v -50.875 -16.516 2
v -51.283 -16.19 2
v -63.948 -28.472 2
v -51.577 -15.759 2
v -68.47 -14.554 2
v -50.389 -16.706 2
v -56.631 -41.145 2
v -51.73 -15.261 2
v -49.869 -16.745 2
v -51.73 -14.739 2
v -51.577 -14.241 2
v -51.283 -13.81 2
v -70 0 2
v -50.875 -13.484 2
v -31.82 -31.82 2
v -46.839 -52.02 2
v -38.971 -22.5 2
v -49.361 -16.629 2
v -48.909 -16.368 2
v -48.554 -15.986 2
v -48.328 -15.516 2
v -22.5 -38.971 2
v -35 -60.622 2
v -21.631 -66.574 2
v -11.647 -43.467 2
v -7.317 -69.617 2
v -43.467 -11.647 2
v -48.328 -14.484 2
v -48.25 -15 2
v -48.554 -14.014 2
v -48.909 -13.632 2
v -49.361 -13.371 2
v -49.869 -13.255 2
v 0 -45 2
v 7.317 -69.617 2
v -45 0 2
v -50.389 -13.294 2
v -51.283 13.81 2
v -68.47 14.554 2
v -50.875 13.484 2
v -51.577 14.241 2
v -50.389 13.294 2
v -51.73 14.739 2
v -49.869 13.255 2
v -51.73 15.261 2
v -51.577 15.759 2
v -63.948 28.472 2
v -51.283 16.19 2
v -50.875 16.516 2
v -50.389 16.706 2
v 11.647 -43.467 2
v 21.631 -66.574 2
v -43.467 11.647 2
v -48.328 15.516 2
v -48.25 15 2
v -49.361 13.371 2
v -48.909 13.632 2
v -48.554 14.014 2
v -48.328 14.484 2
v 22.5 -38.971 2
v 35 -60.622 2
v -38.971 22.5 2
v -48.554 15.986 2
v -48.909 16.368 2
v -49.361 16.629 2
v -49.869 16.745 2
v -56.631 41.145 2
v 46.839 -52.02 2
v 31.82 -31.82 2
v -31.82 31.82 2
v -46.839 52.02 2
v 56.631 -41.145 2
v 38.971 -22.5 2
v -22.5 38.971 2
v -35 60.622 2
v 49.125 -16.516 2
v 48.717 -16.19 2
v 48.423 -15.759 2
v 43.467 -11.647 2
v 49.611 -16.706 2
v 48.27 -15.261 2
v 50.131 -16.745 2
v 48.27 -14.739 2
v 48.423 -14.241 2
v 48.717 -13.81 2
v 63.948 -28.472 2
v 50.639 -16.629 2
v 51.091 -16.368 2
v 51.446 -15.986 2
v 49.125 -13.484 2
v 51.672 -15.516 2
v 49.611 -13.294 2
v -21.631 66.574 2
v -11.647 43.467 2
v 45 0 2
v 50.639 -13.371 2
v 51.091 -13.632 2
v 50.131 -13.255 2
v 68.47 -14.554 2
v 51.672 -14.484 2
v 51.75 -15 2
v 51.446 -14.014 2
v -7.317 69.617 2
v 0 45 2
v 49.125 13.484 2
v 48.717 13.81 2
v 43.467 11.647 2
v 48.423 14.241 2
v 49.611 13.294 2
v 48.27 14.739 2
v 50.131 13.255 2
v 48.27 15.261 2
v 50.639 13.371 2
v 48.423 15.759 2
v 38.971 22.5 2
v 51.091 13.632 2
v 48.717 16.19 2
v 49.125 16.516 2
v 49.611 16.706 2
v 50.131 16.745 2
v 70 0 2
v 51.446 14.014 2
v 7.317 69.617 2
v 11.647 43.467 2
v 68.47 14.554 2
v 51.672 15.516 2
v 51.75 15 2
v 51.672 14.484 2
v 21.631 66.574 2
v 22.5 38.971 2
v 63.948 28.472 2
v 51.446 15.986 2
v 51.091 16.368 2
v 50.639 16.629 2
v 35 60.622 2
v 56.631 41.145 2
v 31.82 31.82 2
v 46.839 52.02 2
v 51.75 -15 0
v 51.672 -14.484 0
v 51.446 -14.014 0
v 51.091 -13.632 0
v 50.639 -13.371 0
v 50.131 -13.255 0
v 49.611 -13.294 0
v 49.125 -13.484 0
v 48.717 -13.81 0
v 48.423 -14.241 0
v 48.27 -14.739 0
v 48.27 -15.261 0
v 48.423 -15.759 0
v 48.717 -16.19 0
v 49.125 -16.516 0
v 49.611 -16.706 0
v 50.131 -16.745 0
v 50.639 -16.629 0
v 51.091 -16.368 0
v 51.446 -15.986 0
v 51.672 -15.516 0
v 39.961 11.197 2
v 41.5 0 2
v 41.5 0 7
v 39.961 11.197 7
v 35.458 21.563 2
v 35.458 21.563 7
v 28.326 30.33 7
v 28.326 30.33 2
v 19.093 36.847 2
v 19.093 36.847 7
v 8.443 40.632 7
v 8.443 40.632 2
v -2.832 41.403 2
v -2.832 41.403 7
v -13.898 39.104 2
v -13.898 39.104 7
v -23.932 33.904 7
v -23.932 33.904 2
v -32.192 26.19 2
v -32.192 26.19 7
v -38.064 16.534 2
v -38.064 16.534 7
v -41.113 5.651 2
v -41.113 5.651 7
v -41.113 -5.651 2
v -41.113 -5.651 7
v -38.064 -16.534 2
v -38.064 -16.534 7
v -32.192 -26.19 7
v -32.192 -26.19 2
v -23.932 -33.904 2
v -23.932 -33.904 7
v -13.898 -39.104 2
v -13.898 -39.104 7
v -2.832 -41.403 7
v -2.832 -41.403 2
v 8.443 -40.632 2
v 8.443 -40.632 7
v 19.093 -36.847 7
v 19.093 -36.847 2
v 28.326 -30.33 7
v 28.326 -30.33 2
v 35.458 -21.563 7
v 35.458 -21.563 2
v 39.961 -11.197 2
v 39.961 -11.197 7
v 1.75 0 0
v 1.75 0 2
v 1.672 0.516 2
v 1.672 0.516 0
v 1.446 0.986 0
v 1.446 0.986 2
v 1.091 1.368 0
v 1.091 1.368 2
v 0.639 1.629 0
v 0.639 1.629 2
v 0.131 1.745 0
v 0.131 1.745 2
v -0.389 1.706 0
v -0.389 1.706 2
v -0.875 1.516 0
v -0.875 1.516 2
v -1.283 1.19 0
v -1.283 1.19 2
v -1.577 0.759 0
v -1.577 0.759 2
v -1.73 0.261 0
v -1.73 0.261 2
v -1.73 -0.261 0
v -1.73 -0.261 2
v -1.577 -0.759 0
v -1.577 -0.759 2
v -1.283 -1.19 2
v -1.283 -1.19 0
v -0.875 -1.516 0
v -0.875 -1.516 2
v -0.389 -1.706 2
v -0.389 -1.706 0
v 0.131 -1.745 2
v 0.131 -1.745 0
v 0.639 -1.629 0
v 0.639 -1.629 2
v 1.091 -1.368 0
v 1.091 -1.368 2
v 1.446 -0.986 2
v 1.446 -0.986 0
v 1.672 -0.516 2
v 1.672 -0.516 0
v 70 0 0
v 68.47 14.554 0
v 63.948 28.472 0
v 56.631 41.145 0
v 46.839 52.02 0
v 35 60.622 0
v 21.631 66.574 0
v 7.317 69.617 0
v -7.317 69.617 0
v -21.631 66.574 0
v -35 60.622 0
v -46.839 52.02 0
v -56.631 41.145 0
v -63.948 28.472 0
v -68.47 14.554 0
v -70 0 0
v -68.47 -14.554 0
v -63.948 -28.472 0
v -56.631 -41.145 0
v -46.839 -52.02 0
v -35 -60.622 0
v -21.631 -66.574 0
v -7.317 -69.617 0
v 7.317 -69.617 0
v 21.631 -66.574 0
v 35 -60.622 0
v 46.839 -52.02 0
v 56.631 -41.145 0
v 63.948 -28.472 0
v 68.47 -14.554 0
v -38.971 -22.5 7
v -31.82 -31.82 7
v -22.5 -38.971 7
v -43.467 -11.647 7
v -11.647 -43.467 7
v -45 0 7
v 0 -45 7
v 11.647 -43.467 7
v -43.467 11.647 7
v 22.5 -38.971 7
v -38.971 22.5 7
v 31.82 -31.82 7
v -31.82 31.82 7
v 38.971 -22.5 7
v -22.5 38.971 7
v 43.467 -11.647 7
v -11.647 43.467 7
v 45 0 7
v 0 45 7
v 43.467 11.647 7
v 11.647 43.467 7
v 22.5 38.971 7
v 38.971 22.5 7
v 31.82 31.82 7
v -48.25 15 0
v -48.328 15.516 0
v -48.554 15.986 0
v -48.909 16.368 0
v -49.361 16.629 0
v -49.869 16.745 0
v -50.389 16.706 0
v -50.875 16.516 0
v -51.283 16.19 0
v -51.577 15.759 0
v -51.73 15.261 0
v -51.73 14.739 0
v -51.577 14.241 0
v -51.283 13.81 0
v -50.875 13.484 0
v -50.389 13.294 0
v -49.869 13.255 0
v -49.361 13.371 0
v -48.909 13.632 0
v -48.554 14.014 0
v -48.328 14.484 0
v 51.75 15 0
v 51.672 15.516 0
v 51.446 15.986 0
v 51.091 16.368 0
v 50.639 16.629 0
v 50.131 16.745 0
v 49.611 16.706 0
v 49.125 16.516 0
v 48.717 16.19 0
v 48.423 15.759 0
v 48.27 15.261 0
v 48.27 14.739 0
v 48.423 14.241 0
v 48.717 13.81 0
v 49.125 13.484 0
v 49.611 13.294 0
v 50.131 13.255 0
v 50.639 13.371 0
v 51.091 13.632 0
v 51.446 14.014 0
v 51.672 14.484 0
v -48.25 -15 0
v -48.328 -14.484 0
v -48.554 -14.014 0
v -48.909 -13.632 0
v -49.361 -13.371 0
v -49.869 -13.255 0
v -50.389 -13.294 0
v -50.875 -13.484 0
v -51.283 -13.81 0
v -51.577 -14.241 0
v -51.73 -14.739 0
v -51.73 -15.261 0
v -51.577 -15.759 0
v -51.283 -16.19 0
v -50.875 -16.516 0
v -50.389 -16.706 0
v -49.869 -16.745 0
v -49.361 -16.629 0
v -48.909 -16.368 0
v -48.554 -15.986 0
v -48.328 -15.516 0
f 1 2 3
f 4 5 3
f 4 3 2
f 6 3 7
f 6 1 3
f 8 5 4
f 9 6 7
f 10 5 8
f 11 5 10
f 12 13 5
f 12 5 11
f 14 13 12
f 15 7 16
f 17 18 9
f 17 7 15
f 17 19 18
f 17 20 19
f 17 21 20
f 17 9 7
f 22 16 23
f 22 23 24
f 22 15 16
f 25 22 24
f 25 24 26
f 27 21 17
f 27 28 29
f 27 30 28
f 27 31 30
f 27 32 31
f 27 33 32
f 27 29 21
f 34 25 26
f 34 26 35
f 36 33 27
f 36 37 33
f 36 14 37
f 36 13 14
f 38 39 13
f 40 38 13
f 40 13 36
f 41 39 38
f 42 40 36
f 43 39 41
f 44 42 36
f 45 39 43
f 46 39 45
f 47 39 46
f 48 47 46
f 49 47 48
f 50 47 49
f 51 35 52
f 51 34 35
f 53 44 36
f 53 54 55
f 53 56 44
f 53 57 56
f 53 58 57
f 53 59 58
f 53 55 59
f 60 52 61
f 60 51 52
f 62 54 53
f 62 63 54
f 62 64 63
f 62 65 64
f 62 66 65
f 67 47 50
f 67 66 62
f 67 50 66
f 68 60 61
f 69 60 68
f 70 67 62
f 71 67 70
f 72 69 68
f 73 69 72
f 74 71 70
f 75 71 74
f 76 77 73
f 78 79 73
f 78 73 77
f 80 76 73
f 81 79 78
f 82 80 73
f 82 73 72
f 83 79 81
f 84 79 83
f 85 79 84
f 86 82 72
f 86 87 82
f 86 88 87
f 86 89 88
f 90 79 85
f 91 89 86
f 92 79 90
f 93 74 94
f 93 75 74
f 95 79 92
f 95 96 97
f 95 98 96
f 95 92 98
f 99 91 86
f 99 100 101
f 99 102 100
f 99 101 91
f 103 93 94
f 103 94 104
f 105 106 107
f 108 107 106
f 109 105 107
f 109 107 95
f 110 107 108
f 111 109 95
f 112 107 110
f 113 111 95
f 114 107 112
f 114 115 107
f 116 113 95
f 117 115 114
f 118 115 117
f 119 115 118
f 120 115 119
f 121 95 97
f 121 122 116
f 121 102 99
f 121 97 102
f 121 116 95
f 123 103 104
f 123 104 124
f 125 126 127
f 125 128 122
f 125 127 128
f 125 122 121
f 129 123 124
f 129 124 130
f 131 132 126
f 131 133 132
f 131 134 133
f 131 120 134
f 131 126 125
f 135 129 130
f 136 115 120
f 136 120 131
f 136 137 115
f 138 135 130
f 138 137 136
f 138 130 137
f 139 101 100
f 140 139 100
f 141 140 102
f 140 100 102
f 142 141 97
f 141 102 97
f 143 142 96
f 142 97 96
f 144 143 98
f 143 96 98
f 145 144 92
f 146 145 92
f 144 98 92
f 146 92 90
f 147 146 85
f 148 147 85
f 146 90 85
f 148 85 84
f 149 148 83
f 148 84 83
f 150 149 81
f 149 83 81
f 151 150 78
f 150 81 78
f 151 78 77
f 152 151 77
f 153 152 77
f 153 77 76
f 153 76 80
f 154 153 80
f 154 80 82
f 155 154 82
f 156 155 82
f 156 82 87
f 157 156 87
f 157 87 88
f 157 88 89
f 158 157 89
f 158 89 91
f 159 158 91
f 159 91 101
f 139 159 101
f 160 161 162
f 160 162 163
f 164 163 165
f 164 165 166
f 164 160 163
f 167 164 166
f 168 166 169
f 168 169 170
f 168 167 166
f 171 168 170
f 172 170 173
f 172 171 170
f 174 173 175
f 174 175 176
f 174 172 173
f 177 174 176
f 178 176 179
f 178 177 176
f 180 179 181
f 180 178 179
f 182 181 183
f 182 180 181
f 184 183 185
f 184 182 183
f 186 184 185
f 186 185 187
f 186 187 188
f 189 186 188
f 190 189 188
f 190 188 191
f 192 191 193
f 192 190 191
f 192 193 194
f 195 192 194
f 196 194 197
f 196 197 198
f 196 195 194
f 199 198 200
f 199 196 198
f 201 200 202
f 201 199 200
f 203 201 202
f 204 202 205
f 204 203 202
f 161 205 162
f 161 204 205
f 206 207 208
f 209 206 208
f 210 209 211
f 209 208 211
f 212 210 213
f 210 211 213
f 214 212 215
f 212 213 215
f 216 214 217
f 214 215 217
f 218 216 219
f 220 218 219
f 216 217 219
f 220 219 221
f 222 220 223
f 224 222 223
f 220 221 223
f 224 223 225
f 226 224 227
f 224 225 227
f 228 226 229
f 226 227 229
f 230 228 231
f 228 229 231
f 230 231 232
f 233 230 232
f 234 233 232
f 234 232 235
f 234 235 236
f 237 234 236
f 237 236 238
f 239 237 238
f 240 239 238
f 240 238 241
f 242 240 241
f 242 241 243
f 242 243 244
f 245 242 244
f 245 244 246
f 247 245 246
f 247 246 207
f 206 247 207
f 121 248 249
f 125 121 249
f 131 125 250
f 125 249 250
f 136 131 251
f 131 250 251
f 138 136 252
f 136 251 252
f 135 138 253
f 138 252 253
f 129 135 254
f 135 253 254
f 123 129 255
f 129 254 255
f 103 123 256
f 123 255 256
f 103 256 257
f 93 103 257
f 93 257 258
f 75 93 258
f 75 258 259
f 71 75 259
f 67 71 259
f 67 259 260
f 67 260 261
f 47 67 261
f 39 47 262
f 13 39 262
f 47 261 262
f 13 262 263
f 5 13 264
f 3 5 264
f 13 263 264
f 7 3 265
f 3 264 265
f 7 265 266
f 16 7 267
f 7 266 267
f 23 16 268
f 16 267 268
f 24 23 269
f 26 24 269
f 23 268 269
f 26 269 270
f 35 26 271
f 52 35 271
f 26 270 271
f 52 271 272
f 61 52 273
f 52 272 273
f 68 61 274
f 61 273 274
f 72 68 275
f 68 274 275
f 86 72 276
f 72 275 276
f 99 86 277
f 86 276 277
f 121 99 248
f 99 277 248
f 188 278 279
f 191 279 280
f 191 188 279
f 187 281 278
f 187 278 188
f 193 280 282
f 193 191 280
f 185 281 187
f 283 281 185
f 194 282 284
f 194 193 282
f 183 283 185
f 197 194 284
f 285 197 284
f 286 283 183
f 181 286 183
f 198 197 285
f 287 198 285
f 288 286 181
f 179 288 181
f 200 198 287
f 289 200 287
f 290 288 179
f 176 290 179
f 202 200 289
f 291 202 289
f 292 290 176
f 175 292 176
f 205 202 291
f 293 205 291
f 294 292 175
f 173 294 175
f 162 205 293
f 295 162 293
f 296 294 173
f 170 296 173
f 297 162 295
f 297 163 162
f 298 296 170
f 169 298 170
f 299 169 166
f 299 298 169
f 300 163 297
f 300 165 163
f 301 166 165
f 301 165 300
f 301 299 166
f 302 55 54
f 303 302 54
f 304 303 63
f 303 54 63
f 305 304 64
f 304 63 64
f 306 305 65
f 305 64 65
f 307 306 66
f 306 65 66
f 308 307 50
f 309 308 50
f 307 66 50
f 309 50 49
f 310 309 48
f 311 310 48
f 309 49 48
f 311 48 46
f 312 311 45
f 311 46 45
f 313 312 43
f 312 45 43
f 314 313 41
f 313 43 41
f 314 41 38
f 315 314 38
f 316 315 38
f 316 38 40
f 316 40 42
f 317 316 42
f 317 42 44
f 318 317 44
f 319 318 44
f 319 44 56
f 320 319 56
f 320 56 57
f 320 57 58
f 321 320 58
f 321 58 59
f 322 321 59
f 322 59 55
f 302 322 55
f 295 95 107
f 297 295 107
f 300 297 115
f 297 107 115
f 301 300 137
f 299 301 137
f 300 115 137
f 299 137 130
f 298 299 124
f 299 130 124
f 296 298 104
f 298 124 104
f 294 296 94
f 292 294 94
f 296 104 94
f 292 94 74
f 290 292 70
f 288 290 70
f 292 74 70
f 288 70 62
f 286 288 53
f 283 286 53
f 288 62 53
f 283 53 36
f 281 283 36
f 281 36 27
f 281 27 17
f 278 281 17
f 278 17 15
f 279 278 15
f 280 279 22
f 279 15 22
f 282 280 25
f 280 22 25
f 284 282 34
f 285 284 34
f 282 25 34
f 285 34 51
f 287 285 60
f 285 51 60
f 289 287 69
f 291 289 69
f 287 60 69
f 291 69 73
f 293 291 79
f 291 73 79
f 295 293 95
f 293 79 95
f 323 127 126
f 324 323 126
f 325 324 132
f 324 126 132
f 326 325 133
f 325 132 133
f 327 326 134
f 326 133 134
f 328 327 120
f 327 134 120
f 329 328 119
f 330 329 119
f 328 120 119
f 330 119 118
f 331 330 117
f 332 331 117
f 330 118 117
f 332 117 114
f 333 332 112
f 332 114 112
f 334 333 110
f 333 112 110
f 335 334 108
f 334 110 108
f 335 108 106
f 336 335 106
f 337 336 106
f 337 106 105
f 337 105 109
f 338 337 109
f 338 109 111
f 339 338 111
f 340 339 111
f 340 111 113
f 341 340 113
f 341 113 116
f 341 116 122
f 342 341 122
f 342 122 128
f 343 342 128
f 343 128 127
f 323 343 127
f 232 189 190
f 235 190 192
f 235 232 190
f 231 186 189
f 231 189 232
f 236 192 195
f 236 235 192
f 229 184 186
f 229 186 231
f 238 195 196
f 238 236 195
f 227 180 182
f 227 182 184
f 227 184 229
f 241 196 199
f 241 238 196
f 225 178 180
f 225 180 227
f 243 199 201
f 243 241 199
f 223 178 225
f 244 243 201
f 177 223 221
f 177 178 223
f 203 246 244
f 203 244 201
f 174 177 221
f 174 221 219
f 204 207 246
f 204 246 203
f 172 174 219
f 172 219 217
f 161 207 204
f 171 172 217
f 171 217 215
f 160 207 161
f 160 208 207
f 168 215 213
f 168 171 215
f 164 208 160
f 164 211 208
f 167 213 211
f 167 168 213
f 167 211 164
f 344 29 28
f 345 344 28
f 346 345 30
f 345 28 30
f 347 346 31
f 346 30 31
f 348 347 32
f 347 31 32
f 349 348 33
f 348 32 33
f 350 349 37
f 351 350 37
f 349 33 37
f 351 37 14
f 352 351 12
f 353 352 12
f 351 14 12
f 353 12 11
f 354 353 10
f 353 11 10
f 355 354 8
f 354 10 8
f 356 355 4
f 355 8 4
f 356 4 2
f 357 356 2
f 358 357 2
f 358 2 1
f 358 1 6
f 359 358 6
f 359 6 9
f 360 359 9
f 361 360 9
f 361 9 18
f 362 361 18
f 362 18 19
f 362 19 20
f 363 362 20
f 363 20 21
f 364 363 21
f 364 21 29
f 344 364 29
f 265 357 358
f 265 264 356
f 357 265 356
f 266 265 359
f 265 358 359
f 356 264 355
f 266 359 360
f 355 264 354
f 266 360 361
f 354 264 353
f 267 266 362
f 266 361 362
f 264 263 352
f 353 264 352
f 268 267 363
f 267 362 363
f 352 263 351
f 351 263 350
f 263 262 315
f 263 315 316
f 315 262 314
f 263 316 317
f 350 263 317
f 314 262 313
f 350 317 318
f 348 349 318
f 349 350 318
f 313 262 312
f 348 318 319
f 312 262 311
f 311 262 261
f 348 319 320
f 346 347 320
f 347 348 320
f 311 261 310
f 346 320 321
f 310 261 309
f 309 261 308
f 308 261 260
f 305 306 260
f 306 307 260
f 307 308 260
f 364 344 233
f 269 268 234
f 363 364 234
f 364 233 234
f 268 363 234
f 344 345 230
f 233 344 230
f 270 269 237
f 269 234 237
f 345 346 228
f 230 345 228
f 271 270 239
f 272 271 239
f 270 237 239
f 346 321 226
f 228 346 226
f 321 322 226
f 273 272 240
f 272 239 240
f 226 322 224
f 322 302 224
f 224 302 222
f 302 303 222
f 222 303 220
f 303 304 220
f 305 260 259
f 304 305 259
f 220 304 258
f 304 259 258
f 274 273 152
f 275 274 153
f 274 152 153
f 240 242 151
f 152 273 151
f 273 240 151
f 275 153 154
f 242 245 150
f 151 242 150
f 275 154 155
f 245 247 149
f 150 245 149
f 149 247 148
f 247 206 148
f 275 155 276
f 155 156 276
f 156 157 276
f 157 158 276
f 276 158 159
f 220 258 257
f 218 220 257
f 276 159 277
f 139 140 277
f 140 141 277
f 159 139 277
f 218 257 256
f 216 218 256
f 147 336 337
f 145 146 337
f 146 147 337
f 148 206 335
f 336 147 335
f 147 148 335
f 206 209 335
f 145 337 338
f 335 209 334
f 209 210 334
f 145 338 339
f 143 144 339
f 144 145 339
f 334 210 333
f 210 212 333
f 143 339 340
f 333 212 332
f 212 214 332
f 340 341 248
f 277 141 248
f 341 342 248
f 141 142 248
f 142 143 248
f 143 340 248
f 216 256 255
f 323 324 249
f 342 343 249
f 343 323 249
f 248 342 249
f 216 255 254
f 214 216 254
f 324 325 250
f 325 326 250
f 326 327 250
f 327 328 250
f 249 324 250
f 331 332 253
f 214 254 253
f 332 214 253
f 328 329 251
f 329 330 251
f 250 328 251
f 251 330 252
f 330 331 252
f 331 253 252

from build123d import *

# Parameters (mm, degrees)
SKETCH1_R           = 70
BOSS_EXTRUDE1_DEPTH = 2
SKETCH2_R           = 1.75
CUT_EXTRUDE1_DEPTH  = 100.015150356
SKETCH4_R           = 45
SKETCH4_R_2         = 41.5
BOSS_EXTRUDE2_DEPTH = 5


with BuildPart() as part:
    # Sketch1 → Boss-Extrude1 (new body)
    with BuildSketch(Plane.XY):
        Circle(SKETCH1_R)
    extrude(amount=BOSS_EXTRUDE1_DEPTH)

    # Sketch2 → Cut-Extrude1 (cut, through all)
    with BuildSketch(Plane.XY.offset(2)):
        with Locations((-50, 15)):
            Circle(SKETCH2_R)
        with Locations((50, 15)):
            Circle(SKETCH2_R)
        with Locations((50, -15)):
            Circle(SKETCH2_R)
        with Locations((-50, -15)):
            Circle(SKETCH2_R)
        Circle(SKETCH2_R)
    extrude(amount=-CUT_EXTRUDE1_DEPTH, mode=Mode.SUBTRACT)

    # Sketch4 → Boss-Extrude2 (add)
    with BuildSketch(Plane.XY.offset(2)):
        Circle(SKETCH4_R)
        Circle(SKETCH4_R_2, mode=Mode.SUBTRACT)
    extrude(amount=BOSS_EXTRUDE2_DEPTH)


solid = part.part
